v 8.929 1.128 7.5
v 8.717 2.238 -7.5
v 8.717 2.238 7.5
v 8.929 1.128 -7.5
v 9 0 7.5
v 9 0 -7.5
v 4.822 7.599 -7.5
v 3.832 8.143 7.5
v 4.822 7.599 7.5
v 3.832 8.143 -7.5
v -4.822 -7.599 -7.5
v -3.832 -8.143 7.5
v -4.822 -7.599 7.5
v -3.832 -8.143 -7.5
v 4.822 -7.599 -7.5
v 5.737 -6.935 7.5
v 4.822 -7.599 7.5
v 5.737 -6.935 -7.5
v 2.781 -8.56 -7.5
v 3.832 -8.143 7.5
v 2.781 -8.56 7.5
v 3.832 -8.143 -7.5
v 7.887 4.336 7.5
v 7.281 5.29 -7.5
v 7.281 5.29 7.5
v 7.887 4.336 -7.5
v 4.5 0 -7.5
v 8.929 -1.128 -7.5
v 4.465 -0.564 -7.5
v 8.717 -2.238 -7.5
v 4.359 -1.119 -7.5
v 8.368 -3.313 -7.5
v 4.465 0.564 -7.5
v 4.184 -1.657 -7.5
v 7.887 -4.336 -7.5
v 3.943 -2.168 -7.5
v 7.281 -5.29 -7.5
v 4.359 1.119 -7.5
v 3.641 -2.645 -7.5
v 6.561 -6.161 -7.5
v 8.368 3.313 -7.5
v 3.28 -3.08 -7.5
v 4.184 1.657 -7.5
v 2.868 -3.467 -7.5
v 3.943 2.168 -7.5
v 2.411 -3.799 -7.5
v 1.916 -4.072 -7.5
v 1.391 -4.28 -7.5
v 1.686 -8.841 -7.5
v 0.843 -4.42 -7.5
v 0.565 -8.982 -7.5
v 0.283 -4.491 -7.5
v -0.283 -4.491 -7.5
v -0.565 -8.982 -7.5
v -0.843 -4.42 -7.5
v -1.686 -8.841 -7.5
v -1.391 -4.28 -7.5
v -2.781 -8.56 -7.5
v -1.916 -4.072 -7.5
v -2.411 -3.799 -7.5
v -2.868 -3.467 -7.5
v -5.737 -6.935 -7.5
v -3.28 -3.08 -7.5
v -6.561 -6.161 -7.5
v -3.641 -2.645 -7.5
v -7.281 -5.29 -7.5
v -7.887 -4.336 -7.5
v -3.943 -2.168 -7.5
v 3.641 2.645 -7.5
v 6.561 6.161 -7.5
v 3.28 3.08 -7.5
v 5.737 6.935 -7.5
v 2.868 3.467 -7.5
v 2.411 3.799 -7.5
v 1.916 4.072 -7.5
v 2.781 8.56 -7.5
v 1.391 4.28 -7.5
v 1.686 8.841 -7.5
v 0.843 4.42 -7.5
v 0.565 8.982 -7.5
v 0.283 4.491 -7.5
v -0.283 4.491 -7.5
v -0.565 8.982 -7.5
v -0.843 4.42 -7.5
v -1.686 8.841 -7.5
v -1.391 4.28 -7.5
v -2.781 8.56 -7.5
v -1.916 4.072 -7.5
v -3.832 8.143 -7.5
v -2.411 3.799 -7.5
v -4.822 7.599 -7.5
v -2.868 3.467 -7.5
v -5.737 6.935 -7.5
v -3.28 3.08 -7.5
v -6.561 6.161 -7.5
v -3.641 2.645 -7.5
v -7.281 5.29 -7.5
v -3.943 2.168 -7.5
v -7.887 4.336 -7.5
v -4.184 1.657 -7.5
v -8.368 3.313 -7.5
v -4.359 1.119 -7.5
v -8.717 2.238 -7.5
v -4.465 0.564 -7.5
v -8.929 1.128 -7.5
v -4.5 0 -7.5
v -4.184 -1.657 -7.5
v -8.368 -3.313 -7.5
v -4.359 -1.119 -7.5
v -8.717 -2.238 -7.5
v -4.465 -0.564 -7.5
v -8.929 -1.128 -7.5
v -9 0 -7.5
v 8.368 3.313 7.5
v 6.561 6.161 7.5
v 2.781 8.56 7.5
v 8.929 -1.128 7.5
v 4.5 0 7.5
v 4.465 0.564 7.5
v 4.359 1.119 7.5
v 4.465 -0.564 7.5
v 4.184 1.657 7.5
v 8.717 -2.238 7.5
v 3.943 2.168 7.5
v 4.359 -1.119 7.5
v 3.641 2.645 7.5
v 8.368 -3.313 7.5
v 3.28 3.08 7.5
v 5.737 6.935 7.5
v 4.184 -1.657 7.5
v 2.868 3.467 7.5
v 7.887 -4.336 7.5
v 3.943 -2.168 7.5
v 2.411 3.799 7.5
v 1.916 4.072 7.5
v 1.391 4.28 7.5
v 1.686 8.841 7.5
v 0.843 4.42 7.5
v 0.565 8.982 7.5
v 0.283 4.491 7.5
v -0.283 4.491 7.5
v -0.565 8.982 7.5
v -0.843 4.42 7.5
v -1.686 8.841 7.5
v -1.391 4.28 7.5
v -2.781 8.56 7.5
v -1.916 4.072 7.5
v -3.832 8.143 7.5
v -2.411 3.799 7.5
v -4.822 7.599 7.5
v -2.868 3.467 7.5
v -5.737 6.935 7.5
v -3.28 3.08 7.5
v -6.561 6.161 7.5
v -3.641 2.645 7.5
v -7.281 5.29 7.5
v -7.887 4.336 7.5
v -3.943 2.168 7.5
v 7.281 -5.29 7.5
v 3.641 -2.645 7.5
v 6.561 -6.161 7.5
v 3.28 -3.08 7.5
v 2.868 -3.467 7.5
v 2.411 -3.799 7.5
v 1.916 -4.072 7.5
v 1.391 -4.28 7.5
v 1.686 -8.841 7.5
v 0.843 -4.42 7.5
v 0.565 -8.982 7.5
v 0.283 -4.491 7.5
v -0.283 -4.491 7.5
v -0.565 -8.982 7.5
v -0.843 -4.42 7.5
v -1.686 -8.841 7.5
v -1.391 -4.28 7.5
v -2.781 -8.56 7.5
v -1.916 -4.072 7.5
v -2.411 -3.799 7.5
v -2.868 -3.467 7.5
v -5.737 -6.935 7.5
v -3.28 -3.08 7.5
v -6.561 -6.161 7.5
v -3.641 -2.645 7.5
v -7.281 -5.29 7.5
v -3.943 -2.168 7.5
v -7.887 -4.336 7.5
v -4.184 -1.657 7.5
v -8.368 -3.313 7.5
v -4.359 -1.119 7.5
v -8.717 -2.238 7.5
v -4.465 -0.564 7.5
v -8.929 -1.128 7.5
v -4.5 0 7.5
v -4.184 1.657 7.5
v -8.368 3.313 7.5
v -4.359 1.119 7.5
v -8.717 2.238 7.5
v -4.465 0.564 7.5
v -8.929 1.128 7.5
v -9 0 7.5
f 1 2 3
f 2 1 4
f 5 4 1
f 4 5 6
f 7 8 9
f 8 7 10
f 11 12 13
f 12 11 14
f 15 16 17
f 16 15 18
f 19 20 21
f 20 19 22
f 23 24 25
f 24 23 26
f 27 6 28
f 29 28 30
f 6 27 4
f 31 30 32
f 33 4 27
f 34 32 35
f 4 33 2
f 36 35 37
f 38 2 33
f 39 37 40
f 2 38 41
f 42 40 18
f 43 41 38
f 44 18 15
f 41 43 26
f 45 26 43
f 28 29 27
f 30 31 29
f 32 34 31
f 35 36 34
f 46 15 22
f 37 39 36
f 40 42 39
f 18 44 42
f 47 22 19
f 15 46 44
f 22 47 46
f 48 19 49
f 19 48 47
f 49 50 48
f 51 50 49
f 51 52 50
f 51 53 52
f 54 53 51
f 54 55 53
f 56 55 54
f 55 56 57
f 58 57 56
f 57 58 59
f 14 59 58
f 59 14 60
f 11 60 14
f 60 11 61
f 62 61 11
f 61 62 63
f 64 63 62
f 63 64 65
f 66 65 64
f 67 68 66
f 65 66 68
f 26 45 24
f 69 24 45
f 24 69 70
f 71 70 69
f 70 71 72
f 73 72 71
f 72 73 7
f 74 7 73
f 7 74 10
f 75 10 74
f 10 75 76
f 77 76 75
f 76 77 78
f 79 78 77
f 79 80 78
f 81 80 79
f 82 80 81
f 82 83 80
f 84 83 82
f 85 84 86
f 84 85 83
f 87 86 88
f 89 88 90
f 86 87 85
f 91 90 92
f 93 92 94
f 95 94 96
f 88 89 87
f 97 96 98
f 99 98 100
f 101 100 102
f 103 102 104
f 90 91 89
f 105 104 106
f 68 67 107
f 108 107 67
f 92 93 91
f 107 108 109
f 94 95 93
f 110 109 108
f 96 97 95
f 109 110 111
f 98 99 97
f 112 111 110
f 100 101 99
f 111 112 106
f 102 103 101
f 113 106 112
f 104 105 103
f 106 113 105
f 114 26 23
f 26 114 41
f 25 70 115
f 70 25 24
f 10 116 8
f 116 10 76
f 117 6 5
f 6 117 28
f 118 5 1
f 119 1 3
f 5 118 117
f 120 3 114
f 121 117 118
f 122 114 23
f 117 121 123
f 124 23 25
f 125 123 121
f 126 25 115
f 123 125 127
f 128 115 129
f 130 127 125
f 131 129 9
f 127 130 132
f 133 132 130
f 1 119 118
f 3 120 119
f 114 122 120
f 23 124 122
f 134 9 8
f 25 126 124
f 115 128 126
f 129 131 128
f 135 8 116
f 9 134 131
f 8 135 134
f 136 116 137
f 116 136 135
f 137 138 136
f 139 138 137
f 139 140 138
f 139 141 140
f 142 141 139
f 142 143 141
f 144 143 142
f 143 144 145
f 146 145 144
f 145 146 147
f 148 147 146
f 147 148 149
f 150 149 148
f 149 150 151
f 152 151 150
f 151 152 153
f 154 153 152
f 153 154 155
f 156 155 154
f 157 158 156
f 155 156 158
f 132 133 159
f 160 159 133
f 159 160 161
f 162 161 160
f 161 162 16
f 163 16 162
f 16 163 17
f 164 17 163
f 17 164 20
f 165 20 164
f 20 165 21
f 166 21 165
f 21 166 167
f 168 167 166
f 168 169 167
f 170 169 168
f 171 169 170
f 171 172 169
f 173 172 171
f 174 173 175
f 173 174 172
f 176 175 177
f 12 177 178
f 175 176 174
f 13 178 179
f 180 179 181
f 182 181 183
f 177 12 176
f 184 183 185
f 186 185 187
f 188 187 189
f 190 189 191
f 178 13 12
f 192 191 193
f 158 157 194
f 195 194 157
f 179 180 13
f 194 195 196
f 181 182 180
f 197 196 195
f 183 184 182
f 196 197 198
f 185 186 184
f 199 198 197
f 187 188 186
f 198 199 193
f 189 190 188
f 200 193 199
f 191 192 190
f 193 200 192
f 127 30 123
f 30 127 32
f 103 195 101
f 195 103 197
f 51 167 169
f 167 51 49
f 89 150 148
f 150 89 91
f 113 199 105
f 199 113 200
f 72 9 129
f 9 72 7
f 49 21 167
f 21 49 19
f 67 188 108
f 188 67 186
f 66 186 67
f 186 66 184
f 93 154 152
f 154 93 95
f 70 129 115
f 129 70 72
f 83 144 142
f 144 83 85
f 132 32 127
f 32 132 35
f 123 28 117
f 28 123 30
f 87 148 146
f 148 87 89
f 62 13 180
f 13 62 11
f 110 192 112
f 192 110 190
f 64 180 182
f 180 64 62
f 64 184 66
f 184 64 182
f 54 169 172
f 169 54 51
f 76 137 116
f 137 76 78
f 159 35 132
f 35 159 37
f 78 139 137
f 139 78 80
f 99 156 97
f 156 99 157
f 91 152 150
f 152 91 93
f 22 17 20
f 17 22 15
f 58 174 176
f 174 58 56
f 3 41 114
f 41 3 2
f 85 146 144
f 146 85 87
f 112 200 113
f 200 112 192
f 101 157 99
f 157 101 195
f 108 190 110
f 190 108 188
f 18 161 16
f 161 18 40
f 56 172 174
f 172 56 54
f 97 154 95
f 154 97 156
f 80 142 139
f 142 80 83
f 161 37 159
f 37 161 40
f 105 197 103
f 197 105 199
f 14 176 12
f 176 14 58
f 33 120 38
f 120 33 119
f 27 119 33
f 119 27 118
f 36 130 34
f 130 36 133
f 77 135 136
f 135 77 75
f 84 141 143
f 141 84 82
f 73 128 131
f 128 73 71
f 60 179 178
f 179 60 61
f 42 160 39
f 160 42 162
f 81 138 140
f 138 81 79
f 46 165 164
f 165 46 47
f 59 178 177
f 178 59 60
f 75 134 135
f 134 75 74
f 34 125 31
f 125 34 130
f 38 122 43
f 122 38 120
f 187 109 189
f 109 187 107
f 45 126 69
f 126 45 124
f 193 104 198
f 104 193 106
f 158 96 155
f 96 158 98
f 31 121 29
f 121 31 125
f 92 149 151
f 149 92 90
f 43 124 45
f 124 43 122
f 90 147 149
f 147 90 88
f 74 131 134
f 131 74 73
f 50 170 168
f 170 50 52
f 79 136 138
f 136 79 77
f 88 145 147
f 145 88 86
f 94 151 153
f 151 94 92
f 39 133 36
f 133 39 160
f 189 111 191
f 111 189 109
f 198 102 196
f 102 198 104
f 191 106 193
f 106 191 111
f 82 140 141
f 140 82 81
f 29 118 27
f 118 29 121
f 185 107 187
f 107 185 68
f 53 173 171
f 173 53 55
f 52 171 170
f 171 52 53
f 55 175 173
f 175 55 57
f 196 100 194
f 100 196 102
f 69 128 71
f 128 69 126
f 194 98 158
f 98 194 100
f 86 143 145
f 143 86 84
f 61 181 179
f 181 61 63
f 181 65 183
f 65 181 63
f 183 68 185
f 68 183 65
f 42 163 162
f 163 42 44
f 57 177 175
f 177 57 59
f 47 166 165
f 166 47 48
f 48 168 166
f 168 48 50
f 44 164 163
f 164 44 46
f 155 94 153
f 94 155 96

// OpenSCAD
$fn = 50;


difference() {
	union() {
		translate(v = [0, 0, -7.5000000000]) {
			cylinder(h = 15, r = 9.0000000000);
		}
	}
	union() {
		translate(v = [0, 0, -100.0000000000]) {
			cylinder(h = 200, r = 4.5000000000);
		}
	}
}
